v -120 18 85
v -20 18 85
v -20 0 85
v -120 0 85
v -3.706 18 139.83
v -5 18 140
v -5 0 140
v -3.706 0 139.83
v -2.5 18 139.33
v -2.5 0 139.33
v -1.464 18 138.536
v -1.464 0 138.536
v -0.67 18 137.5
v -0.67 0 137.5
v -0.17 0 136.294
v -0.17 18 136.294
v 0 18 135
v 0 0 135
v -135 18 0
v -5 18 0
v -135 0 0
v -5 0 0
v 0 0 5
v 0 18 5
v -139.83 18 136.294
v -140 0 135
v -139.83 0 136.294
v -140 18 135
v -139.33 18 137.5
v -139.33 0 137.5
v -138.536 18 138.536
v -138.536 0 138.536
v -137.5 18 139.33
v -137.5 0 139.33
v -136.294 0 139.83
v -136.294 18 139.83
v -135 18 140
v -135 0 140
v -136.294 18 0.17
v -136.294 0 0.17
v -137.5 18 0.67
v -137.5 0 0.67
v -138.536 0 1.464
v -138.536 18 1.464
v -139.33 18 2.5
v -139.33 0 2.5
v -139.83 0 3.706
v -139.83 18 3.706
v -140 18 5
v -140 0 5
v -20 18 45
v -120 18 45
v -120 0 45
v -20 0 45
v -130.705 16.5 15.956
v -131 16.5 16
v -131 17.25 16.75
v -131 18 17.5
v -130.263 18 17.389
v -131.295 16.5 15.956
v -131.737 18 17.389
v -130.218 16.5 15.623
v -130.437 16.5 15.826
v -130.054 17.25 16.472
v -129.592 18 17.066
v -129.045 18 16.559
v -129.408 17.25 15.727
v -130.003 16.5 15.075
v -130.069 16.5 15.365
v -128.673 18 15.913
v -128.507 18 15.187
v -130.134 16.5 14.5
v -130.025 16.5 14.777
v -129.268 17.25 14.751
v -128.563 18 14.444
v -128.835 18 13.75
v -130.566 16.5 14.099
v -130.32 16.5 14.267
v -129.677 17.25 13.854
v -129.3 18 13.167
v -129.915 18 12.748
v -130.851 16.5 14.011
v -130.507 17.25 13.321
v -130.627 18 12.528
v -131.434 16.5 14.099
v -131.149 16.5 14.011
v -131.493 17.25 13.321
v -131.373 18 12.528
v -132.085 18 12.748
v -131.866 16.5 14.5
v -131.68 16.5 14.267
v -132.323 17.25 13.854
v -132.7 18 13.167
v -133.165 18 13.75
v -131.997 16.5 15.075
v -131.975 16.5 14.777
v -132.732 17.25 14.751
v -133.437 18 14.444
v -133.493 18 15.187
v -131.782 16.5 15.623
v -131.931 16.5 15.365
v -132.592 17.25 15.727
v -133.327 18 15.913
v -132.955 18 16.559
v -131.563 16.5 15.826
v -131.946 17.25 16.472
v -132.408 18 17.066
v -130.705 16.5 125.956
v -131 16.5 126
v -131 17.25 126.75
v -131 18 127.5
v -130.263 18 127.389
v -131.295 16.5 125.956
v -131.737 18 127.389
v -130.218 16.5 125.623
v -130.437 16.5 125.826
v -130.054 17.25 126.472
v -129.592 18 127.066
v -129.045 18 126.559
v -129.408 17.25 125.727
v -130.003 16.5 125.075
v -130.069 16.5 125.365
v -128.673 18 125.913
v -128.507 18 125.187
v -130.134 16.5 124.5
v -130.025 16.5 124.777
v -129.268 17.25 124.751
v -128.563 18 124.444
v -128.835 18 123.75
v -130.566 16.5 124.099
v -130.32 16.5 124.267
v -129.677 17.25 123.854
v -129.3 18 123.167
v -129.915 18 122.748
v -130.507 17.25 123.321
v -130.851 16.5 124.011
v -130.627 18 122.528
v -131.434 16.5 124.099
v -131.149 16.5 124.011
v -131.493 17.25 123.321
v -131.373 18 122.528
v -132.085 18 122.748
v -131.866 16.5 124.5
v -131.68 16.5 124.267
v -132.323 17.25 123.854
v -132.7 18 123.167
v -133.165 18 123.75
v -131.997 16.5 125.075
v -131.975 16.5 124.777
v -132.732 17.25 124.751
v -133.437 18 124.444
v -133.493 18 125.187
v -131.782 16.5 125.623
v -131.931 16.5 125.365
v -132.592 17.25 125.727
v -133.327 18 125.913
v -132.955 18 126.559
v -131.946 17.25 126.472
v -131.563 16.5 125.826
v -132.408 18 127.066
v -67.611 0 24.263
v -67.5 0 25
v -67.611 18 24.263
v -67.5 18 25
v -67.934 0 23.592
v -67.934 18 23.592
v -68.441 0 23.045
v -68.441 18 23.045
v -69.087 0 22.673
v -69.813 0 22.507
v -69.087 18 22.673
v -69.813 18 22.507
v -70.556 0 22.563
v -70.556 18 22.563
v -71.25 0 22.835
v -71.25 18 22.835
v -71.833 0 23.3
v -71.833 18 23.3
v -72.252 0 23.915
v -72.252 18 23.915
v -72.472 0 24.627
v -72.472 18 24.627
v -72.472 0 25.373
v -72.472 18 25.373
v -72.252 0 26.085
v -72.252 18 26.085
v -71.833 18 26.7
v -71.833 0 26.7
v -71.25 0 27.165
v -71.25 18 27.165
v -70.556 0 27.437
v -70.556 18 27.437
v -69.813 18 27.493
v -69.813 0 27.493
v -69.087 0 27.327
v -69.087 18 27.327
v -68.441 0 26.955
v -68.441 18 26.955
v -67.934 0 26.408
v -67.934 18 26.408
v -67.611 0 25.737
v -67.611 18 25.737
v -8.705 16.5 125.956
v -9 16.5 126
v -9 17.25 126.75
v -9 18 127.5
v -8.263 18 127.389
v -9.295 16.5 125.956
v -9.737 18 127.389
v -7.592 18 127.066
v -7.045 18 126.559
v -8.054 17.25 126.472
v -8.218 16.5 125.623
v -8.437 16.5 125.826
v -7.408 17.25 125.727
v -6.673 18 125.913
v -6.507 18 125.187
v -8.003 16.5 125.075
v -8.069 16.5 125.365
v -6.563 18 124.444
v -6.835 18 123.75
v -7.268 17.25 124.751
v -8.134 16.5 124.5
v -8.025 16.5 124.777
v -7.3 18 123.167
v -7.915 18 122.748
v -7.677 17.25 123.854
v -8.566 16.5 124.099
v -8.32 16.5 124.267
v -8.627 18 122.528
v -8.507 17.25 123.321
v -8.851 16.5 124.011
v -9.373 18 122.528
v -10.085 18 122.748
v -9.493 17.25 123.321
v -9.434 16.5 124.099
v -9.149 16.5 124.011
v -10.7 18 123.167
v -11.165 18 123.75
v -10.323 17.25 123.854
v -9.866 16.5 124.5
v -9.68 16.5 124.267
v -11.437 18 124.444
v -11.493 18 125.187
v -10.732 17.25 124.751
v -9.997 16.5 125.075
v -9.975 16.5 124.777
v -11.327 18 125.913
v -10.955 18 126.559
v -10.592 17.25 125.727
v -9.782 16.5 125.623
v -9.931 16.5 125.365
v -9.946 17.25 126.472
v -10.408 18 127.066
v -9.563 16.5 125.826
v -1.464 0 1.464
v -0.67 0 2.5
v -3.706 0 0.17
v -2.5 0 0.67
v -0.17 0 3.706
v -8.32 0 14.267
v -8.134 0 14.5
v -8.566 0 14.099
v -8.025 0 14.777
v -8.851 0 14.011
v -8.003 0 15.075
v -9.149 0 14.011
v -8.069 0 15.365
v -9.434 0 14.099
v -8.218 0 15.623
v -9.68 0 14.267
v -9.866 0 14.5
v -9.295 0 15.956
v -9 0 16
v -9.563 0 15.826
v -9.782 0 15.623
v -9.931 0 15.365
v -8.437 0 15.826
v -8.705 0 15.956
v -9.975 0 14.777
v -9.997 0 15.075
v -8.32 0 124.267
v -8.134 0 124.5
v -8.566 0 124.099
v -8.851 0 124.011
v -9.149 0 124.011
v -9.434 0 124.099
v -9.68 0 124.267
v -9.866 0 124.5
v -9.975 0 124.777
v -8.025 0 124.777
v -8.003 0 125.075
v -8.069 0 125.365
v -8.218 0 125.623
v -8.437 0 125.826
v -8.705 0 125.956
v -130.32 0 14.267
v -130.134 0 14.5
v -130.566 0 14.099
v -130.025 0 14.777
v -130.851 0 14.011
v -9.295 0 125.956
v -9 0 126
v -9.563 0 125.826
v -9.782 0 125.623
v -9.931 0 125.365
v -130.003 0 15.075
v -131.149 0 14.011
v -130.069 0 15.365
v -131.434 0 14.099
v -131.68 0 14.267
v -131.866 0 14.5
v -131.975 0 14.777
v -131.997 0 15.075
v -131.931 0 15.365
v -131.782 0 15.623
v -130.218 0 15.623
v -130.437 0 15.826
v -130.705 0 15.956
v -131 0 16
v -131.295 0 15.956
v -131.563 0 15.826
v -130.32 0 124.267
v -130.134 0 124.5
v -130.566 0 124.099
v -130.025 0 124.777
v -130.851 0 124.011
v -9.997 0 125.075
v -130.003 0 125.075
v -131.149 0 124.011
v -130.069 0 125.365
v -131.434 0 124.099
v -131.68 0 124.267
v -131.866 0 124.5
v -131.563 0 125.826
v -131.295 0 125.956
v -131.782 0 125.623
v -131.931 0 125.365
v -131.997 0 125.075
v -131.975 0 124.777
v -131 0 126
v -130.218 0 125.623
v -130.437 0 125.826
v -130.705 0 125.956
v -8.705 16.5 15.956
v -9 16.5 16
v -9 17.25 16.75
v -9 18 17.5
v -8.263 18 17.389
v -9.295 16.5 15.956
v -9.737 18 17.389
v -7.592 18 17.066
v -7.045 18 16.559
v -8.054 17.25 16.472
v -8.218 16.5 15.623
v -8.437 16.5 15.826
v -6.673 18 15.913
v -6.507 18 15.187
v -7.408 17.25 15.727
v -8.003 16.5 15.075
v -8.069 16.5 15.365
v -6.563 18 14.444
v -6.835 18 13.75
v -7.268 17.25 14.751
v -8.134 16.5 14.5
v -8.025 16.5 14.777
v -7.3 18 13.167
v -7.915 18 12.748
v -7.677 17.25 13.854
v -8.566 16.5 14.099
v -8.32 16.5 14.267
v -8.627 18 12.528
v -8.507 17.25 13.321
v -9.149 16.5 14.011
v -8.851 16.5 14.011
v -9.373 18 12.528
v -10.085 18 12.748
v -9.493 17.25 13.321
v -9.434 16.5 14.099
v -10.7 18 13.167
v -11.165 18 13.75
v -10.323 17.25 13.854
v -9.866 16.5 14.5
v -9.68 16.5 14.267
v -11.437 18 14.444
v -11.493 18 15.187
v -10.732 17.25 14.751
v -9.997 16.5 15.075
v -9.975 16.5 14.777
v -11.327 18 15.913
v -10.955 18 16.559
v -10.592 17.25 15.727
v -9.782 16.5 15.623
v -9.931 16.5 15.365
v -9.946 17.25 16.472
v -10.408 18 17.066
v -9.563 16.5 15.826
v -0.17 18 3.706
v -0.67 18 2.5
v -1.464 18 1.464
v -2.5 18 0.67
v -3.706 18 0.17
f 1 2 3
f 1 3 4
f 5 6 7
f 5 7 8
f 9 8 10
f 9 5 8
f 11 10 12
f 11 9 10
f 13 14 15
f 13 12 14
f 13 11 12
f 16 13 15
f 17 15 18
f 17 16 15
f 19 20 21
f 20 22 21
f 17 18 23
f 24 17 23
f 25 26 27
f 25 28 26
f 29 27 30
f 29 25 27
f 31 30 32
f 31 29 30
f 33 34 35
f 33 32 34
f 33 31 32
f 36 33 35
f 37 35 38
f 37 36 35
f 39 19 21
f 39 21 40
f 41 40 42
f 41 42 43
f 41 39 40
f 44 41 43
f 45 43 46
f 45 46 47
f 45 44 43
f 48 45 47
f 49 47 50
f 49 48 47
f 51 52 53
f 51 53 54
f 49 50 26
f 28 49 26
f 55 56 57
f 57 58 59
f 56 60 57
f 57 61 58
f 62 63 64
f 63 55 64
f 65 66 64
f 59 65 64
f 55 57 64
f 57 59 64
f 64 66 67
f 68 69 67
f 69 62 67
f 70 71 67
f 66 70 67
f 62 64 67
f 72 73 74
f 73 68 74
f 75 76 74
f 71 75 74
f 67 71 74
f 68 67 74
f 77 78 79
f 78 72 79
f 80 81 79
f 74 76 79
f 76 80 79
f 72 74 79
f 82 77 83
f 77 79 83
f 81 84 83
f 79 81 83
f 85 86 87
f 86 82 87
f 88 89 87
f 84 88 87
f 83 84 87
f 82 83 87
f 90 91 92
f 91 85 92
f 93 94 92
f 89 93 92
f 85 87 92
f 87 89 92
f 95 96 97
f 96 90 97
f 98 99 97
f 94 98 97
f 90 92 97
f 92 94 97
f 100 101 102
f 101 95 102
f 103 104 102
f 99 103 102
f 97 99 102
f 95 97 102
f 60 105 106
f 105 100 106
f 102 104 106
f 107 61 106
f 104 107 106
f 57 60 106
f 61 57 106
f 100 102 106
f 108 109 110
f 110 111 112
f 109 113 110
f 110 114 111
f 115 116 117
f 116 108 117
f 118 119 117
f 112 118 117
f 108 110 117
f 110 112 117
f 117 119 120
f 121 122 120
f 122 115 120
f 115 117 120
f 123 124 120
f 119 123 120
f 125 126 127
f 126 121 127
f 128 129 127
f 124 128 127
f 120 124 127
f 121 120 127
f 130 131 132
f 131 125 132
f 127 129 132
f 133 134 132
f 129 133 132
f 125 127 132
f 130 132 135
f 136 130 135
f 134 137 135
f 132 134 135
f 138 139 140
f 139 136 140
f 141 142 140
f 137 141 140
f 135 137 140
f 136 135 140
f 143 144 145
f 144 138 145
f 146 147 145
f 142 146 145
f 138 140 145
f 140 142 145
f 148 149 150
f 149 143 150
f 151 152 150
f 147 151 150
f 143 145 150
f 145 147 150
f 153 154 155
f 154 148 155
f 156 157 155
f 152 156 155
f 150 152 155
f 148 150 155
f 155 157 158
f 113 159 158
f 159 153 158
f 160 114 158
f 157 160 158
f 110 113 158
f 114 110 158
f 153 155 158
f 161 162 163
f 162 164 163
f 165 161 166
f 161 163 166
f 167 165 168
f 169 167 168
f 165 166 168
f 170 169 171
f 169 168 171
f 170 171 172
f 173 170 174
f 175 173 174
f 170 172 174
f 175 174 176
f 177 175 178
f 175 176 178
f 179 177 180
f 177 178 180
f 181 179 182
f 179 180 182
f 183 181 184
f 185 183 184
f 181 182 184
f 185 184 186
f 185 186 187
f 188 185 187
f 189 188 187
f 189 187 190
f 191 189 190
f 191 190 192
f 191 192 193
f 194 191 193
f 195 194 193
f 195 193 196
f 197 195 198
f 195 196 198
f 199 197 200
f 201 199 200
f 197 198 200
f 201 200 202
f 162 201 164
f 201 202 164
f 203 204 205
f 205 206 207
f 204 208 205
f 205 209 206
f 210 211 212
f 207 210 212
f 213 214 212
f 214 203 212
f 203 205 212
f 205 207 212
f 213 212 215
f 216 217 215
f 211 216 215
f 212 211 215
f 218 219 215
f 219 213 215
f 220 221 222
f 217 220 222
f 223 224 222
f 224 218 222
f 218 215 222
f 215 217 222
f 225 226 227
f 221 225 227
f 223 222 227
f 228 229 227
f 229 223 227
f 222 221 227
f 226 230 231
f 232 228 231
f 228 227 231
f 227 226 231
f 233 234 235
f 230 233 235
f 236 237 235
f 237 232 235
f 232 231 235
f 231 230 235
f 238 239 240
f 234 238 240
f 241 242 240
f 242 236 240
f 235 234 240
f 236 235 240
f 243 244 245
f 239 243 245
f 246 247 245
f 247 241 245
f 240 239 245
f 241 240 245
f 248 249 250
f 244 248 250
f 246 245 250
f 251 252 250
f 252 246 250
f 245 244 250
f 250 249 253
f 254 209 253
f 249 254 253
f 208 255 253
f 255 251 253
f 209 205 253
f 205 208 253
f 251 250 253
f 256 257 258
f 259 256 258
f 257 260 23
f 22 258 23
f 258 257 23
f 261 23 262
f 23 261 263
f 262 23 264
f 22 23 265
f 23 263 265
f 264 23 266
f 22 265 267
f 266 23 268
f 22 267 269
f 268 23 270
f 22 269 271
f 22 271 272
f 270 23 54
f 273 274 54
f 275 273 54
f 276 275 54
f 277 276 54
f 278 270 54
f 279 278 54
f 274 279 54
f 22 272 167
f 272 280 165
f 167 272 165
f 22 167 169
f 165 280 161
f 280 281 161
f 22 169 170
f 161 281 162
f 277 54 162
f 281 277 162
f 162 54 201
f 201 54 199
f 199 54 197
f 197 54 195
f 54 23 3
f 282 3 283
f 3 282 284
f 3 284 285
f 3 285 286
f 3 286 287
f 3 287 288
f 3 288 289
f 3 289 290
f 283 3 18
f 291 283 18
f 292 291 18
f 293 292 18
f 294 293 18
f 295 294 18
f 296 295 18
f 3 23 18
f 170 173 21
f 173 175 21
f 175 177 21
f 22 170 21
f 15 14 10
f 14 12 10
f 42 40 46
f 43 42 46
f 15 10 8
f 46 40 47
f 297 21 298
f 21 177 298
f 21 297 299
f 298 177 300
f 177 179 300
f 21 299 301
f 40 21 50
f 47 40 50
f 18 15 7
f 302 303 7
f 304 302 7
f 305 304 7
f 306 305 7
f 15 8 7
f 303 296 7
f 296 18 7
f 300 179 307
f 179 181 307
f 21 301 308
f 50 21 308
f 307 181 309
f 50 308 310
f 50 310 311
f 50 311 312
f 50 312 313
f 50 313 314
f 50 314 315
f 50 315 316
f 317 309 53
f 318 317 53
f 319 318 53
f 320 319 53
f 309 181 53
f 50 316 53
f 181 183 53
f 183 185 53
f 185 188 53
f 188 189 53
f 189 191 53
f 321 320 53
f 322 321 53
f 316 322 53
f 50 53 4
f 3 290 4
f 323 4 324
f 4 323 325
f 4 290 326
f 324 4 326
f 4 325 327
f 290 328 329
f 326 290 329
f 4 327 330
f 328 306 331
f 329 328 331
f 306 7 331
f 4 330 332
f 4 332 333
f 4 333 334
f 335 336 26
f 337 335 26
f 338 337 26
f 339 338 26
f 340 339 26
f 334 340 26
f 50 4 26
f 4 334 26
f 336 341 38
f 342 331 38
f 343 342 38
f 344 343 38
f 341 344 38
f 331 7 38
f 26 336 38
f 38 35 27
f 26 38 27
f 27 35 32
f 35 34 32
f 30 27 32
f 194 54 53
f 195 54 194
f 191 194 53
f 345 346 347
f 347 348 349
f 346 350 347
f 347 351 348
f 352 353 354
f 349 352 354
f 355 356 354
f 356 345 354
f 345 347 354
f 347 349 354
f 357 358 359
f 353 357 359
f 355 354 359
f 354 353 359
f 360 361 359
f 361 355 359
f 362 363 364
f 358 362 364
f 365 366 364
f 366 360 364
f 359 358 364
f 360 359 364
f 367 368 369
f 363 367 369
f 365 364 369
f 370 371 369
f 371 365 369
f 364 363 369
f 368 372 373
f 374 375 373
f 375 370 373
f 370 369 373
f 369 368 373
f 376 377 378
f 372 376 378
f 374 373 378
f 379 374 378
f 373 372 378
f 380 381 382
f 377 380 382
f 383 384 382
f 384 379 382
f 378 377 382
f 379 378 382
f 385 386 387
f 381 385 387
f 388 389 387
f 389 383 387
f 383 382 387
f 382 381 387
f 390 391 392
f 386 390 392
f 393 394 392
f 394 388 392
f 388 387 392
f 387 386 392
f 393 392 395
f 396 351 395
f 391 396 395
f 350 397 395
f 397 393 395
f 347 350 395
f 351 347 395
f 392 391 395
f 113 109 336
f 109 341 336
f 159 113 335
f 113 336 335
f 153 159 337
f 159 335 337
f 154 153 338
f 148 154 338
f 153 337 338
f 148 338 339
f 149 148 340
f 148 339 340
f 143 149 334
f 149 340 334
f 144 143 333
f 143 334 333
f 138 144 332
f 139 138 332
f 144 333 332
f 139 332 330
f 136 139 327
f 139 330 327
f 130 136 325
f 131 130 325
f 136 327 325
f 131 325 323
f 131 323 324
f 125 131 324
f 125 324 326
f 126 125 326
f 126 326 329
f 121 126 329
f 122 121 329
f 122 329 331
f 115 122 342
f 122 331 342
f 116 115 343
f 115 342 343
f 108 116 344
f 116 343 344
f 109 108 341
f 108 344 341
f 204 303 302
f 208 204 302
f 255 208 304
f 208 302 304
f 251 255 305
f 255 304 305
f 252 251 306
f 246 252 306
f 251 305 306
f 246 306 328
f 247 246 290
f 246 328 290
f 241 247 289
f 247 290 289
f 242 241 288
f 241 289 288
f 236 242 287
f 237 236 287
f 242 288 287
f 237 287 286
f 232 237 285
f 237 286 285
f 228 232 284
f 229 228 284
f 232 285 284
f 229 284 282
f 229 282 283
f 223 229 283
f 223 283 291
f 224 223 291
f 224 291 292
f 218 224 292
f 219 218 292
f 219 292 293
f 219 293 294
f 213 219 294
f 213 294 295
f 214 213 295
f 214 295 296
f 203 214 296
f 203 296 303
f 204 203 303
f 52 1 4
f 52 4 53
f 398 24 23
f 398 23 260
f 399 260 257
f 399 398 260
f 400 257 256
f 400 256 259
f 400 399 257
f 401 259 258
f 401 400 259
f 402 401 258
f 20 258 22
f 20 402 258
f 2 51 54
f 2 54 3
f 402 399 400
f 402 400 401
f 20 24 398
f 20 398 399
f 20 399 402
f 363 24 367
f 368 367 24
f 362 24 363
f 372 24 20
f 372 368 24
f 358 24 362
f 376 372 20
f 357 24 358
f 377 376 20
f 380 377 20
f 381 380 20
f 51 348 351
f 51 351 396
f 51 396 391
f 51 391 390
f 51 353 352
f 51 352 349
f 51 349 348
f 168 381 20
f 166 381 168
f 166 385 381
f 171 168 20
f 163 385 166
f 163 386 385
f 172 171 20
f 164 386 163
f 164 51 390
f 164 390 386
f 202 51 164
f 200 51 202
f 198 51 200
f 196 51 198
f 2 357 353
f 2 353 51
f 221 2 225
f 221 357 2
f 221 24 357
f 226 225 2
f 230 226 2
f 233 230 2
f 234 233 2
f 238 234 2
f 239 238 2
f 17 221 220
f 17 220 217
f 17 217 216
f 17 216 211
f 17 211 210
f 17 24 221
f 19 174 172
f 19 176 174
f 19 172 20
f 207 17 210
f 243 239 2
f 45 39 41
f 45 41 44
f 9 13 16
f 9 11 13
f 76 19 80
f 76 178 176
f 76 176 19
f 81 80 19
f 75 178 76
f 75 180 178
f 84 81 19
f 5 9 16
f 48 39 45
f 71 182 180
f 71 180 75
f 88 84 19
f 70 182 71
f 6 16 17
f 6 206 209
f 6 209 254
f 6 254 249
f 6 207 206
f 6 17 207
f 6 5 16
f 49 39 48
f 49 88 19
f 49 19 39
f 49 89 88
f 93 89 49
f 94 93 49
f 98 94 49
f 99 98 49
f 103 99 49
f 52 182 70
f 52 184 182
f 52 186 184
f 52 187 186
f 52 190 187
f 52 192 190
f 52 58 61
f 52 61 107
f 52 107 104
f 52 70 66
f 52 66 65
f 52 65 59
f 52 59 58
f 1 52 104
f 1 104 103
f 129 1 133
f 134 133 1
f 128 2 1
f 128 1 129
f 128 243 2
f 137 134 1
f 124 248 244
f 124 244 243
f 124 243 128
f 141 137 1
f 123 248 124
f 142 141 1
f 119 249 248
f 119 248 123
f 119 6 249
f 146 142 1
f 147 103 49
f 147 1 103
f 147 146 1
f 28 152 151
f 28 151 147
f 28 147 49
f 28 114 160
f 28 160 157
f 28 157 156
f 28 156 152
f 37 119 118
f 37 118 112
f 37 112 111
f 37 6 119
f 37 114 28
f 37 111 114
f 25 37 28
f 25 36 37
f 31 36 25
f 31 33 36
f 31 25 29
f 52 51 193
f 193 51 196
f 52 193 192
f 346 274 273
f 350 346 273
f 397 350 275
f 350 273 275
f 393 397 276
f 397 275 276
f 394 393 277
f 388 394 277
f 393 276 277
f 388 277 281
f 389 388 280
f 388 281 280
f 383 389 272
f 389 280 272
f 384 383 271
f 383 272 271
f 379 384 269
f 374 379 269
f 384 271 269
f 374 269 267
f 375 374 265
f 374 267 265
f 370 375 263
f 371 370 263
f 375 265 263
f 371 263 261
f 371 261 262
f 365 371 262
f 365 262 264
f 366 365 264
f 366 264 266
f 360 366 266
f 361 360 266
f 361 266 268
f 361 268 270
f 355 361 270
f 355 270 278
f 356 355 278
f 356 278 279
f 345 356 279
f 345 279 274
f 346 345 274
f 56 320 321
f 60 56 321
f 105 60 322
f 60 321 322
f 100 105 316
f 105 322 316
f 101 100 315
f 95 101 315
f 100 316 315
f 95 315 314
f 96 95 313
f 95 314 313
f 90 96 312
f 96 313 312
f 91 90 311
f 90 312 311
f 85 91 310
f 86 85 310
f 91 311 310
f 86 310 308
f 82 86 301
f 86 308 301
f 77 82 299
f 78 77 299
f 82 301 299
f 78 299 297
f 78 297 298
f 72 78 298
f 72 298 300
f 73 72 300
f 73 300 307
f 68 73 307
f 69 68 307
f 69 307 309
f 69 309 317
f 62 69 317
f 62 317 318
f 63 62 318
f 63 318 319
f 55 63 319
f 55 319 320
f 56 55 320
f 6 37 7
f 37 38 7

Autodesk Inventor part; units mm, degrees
ref_plane "YZ Plane" through (0, 0, 0) normal (1, 0, 0) x (0, 1, 0)
ref_plane "XZ Plane" through (0, 0, 0) normal (0, 1, 0) x (-1, 0, 0)
ref_plane "XY Plane" through (0, 0, 0) normal (0, 0, 1) x (1, 0, 0)
sketch "Skizze1" plane through (0, 0, 0) normal (0, 1, 0) x (-1, 0, 0)
  line L0 (0, 0) -> (140, 0)
  line L1 (140, 0) -> (140, 140)
  line L2 (140, 140) -> (0, 140)
  line L3 (0, 140) -> (0, 0)
  dimension "d0" = 140
  dimension "d1" = 140
extrude "Extrusion1" add sketch "Skizze1" along normal blind 18
sketch "Skizze2" plane through (0, 18, 0) normal (0, 1, 0) x (1, 0, 0)
  line L0 (0, 0) -> (-140, 0) projected
  line L1 (-140, 0) -> (-140, -140) projected
  line L2 (-140, -140) -> (0, -140) projected
  line L3 (0, -140) -> (0, 0) projected
  point P0 (-131, -15)
  point P1 (-131, -125)
  point P2 (-9, -15)
  point P3 (-9, -125)
  dimension "d4" = 15
  dimension "d5" = 15
  dimension "d6" = 15
  dimension "d7" = 15
  dimension "d8" = 9
  dimension "d9" = 9
  dimension "d10" = 9
  dimension "d11" = 9
hole "Bohrung1" at (-131, 18, 15) at (-131, 18, 125) at (-9, 18, 15) at (-9, 18, 125) direction (0, -1, 0) diameter 2 end through all countersink diameter 5 countersink angle 90
fillet "Rundung1" radius 5 4 edges at (-140, 9, 0) (-140, 9, 140) (0, 9, 140) (0, 9, 0)
sketch "Skizze3" plane through (0, 18, 0) normal (0, 1, 0) x (1, 0, 0)
  line L0 (-5, 0) -> (-135, 0) projected
  line L1 (-140, -5) -> (-140, -135) projected
  line L2 (0, -135) -> (0, -5) projected
  line L3 (-120, -45) -> (-20, -45)
  line L4 (-20, -45) -> (-20, -85)
  line L5 (-20, -85) -> (-120, -85)
  line L6 (-120, -85) -> (-120, -45)
  circle A0 centre (-70, -25) radius 2.5
  point P0 (0, 0)
  dimension "d20" = 20
  dimension "d23" = 100
  dimension "d24" = 40
  dimension "d25" = 45
  dimension "d26" = 5
  dimension "d27" = 70
  dimension "d28" = 25
extrude "Extrusion2" cut sketch "Skizze3" against normal blind 18
properties part number "Deckel" material "Eiche, weiß"
